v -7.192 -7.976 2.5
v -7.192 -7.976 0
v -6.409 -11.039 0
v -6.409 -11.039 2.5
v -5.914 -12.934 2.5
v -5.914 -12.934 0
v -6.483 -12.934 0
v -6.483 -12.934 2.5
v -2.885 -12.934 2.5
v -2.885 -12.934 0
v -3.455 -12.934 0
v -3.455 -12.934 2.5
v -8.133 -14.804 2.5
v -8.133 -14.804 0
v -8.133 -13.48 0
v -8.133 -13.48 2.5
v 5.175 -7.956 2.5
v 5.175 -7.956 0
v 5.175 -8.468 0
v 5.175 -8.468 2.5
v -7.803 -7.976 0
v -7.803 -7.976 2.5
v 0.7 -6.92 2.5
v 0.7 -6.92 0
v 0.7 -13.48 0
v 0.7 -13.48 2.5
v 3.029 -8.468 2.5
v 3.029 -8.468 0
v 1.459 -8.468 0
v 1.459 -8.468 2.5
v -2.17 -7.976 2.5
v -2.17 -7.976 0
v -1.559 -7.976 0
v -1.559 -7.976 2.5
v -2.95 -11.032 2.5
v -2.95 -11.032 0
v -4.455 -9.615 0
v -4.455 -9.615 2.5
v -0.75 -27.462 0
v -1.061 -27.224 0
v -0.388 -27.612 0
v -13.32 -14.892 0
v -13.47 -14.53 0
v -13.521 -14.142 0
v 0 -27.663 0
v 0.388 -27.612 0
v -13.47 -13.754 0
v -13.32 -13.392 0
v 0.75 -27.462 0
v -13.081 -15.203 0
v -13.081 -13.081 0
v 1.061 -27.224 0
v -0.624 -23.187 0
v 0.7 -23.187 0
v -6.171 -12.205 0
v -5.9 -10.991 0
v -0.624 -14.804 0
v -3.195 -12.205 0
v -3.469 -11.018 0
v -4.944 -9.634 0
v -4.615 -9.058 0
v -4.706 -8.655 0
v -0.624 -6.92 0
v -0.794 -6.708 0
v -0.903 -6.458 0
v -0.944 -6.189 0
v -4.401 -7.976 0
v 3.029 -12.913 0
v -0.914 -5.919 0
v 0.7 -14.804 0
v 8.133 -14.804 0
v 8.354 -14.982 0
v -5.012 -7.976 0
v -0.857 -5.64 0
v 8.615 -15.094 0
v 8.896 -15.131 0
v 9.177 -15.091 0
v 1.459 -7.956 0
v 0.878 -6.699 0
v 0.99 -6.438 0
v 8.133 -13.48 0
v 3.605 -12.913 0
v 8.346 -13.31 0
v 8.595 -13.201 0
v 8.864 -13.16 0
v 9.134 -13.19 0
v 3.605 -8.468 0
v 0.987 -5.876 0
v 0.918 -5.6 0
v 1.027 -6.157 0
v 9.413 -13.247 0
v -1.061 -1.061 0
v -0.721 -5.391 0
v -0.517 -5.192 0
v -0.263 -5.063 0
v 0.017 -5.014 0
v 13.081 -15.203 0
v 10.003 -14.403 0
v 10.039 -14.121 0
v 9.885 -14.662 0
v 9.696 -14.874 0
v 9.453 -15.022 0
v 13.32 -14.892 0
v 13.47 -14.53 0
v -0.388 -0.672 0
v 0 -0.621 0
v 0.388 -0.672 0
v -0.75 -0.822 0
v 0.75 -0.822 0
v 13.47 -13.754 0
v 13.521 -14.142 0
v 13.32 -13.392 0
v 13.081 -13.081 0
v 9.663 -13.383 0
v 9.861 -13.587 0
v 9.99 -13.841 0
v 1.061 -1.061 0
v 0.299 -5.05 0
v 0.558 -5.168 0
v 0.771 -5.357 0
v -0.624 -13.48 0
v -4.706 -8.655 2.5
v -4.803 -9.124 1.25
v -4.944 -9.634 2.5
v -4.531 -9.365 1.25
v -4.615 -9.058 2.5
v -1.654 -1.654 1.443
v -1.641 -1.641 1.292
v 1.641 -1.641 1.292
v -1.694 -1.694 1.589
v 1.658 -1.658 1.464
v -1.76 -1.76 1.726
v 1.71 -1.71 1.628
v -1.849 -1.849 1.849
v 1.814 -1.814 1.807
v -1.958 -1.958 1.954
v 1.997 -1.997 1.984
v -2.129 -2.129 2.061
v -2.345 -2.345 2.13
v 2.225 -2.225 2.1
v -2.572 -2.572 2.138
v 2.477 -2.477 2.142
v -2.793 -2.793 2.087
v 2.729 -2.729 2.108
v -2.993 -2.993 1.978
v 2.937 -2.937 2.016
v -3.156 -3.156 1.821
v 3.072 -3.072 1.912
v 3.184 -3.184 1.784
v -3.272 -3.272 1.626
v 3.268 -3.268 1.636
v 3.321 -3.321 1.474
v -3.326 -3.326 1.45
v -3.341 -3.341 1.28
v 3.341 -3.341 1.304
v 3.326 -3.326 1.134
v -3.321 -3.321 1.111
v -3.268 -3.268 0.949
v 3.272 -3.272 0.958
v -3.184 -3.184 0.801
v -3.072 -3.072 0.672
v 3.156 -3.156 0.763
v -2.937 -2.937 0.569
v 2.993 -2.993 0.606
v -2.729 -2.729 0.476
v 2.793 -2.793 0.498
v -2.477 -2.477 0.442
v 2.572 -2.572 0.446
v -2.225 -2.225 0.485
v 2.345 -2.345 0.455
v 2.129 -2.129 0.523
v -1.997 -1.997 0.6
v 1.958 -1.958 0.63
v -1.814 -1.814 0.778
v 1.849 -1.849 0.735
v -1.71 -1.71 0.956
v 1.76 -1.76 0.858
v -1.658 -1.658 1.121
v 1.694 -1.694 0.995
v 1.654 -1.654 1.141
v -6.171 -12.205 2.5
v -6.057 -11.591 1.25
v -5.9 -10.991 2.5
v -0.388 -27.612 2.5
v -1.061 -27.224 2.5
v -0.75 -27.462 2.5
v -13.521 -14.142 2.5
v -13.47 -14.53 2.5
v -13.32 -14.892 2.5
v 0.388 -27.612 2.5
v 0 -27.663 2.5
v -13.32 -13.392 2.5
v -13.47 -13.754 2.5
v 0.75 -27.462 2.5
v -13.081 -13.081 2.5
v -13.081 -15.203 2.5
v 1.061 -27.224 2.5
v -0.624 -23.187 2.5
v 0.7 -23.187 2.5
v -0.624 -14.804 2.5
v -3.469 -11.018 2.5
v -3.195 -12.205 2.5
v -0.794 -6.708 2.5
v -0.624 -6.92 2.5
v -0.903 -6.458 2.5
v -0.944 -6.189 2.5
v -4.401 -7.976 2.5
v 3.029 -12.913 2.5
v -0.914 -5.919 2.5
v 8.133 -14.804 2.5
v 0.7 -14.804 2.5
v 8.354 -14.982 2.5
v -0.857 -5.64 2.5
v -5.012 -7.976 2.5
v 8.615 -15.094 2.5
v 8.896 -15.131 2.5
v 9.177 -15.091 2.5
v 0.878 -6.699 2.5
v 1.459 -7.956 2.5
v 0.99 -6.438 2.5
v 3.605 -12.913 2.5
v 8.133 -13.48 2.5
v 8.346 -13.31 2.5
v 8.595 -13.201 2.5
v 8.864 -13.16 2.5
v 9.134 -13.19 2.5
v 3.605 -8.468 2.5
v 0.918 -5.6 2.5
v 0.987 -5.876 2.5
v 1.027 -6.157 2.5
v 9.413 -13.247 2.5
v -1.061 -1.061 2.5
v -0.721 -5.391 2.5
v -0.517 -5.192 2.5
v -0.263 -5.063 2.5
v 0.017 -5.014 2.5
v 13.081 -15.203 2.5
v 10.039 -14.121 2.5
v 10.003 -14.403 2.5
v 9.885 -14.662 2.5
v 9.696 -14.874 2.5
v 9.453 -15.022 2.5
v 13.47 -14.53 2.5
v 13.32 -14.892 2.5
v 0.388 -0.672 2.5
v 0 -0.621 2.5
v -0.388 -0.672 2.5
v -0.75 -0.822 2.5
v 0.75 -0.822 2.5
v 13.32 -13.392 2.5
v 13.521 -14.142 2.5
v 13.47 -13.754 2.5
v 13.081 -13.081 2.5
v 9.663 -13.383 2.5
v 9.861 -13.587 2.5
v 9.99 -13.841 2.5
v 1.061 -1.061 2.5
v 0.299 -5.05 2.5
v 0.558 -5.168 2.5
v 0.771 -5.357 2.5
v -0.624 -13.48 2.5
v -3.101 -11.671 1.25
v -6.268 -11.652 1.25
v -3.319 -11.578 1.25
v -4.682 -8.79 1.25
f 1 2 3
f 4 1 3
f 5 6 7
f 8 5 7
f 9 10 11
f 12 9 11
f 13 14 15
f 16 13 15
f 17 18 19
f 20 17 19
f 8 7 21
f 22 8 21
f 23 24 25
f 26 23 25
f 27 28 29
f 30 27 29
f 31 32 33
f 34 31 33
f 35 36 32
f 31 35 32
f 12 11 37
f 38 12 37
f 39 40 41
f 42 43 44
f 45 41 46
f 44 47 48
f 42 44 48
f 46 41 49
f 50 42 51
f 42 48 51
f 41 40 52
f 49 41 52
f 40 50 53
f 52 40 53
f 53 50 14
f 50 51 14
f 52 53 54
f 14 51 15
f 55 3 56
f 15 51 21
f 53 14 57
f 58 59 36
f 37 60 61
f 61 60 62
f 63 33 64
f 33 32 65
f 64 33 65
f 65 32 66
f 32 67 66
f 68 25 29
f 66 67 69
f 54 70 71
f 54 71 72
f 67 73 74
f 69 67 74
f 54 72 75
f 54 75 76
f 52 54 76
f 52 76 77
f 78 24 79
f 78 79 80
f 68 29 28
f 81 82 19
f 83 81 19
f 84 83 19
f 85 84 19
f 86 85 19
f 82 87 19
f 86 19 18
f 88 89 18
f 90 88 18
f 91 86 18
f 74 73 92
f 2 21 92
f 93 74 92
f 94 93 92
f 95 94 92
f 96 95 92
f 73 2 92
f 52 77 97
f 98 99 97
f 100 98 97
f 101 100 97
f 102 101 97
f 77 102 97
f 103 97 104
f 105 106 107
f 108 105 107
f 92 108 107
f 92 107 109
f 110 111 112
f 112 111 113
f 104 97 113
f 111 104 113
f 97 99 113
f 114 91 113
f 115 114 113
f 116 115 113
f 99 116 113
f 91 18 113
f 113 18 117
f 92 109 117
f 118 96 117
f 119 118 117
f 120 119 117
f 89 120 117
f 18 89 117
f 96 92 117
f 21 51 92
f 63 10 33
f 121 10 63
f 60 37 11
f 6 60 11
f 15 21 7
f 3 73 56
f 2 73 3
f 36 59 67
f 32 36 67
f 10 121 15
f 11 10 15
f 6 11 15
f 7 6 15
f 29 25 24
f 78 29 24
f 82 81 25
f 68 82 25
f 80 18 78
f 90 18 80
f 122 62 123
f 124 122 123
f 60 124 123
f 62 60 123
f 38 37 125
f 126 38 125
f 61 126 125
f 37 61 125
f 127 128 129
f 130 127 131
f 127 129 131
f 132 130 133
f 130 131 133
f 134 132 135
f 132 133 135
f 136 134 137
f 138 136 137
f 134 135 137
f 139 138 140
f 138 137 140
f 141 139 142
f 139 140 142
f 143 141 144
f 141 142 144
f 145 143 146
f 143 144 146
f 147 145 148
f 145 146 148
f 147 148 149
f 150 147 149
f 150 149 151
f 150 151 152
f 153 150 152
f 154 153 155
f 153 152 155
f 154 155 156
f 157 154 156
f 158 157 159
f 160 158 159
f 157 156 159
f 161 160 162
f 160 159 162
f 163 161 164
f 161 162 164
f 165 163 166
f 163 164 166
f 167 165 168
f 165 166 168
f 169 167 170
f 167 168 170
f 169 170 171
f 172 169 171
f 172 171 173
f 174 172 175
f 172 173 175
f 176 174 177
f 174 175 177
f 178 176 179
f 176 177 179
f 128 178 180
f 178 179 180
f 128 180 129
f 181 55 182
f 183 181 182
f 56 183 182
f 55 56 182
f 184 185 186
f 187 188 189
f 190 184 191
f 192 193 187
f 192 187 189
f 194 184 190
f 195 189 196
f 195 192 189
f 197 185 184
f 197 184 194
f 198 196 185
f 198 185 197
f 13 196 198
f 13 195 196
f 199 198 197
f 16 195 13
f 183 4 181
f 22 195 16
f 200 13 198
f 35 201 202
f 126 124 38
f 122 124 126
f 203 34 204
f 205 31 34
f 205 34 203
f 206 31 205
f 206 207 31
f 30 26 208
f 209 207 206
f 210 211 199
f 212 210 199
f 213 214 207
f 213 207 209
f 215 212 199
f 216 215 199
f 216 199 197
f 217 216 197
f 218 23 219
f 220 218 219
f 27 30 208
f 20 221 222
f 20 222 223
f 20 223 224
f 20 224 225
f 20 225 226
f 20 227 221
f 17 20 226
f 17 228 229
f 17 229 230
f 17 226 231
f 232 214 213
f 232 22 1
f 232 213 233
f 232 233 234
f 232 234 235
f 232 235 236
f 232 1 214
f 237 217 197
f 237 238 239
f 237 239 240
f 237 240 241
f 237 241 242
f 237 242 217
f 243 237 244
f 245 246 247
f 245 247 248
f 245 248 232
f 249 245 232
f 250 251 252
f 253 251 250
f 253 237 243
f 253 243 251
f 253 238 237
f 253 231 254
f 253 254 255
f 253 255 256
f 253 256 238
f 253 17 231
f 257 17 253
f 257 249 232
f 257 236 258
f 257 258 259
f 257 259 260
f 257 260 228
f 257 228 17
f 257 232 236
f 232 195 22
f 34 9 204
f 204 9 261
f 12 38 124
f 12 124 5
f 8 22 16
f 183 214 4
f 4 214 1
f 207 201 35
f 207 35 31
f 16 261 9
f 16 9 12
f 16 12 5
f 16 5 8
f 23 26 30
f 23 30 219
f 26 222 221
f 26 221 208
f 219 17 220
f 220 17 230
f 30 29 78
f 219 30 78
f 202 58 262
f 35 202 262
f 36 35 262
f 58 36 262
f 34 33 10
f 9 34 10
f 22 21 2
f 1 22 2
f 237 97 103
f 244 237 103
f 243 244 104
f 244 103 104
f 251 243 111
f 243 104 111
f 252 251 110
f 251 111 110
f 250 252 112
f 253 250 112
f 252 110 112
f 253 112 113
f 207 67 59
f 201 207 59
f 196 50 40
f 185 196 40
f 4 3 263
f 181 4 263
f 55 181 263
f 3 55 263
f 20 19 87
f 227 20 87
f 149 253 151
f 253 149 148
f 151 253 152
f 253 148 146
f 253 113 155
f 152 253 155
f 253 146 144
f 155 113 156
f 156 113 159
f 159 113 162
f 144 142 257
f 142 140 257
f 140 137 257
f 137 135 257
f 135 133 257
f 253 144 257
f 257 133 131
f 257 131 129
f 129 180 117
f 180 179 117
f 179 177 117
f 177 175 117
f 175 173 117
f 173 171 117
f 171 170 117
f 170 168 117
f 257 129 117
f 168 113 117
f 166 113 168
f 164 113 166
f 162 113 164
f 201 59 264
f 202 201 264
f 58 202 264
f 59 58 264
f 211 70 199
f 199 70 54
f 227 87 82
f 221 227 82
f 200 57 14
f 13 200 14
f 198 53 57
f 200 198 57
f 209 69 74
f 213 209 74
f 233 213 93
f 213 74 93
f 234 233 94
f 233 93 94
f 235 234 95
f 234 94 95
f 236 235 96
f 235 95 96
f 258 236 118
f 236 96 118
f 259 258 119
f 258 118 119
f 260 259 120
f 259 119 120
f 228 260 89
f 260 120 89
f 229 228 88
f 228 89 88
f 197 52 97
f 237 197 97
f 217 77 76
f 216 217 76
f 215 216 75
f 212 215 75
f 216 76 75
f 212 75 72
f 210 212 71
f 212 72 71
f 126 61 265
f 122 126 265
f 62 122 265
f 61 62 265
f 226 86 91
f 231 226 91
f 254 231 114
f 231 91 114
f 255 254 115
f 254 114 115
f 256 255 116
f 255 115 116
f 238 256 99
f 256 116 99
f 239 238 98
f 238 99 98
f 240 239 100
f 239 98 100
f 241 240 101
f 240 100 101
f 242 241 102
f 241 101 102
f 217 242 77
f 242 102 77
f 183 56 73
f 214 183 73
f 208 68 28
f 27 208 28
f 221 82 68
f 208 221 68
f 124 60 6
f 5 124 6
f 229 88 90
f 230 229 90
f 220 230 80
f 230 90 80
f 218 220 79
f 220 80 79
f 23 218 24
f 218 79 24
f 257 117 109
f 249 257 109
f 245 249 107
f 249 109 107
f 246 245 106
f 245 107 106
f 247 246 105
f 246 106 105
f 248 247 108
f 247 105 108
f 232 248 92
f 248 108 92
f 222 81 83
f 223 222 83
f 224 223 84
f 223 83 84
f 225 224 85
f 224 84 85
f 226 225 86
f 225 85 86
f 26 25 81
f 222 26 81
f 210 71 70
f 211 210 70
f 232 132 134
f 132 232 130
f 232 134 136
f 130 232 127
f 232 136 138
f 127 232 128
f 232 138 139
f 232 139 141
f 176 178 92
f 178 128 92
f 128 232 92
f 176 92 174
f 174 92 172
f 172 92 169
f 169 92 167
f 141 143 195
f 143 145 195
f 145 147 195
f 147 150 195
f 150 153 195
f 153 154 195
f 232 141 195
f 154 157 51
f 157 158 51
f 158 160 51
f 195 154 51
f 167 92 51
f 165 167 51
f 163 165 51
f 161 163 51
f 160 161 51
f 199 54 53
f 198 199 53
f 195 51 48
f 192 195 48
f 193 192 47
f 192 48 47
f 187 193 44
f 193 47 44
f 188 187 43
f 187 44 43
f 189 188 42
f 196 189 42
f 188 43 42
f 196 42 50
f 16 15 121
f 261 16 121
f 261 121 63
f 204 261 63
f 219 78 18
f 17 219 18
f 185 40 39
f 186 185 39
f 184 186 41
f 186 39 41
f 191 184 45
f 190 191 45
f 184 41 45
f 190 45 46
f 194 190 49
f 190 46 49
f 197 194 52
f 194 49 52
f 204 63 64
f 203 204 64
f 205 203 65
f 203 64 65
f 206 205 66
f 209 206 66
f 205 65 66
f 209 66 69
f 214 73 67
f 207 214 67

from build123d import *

# Parameters (mm, degrees)
F1_DEPTH = 2.5
F2_R     = 0.85
F3_DEPTH = 12.5


with BuildPart() as f1:
    # F0 (on Top) → F1 (new body)
    with BuildSketch(Plane.XY):
        with BuildLine():
            Line((13.081475452, -13.081475452), (1.0606601718, -1.0606601718))
            ThreePointArc((1.0606601718, -1.0606601718), (0, -0.6213203436), (-1.0606601718, -1.0606601718))
            Line((-1.0606601718, -1.0606601718), (-13.081475452, -13.081475452))
            ThreePointArc((-13.081475452, -13.081475452), (-13.5208152802, -14.1421356237), (-13.081475452, -15.2027957955))
            Line((-13.081475452, -15.2027957955), (-1.0606601718, -27.2236110757))
            ThreePointArc((-1.0606601718, -27.2236110757), (0, -27.6629509039), (1.0606601718, -27.2236110757))
            Line((1.0606601718, -27.2236110757), (13.081475452, -15.2027957955))
            ThreePointArc((13.081475452, -15.2027957955), (13.5208152802, -14.1421356237), (13.081475452, -13.081475452))
        make_face()
        with BuildLine():
            Line((-1.559338312, -7.9764372607), (-2.8852931731, -12.9341195524))
            Line((-2.8852931731, -12.9341195524), (-3.4549546314, -12.9341195524))
            Line((-3.4549546314, -12.9341195524), (-4.4553886592, -9.6148921218))
            add(Edge.make_bspline(
                [(-4.4553886592, -9.6148921218), (-4.5270032425, -9.3935379552), (-4.6148938675, -9.0582514968)],
                knots=[0, 0, 0, 1, 1, 1], degree=2))
            add(Edge.make_bspline(
                [(-4.6148938675, -9.0582514968), (-4.7027844925, -8.7229650385), (-4.7060397009, -8.6546056635)],
                knots=[0, 0, 0, 1, 1, 1], degree=2))
            add(Edge.make_bspline(
                [(-4.7060397009, -8.6546056635), (-4.7809094925, -9.102739344), (-4.9436699092, -9.6344233718)],
                knots=[0, 0, 0, 1, 1, 1], degree=2))
            Line((-4.9436699092, -9.6344233718), (-5.9137219925, -12.9341195524))
            Line((-5.9137219925, -12.9341195524), (-6.4833834509, -12.9341195524))
            Line((-6.4833834509, -12.9341195524), (-7.8028278953, -7.9764372607))
            Line((-7.8028278953, -7.9764372607), (-7.1919337981, -7.9764372607))
            Line((-7.1919337981, -7.9764372607), (-6.4085136592, -11.0385032329))
            add(Edge.make_bspline(
                [(-6.4085136592, -11.0385032329), (-6.2457532425, -11.6830344829), (-6.1708834509, -12.2049528857)],
                knots=[0, 0, 0, 1, 1, 1], degree=2))
            add(Edge.make_bspline(
                [(-6.1708834509, -12.2049528857), (-6.0797376175, -11.5842931635), (-5.8996160898, -10.9907601774)],
                knots=[0, 0, 0, 1, 1, 1], degree=2))
            Line((-5.8996160898, -10.9907601774), (-5.0120292842, -7.9764372607))
            Line((-5.0120292842, -7.9764372607), (-4.401135187, -7.9764372607))
            Line((-4.401135187, -7.9764372607), (-3.4690605342, -11.0178869135))
            add(Edge.make_bspline(
                [(-3.4690605342, -11.0178869135), (-3.3063001175, -11.544145594), (-3.1945379648, -12.2049528857)],
                knots=[0, 0, 0, 1, 1, 1], degree=2))
            add(Edge.make_bspline(
                [(-3.1945379648, -12.2049528857), (-3.1294337981, -11.7231820524), (-2.9503973398, -11.0319928163)],
                knots=[0, 0, 0, 1, 1, 1], degree=2))
            Line((-2.9503973398, -11.0319928163), (-2.1702324092, -7.9764372607))
            Line((-2.1702324092, -7.9764372607), (-1.559338312, -7.9764372607))
        make_face(mode=Mode.SUBTRACT)
        with BuildLine():
            Line((-8.1334756687, -14.8039748892), (-8.1334756687, -13.4802963582))
            Line((-8.1334756687, -13.4802963582), (-0.6236797201, -13.4802963582))
            Line((-0.6236797201, -13.4802963582), (-0.6236797201, -6.9198086858))
            ThreePointArc((-0.6236797201, -6.9198086858), (-0.9032194318, -6.4583786209), (-0.9135835525, -5.9189782686))
            ThreePointArc((-0.9135835525, -5.9189782686), (0.0168397474, -5.0141534426), (0.9868078824, -5.876451129))
            ThreePointArc((0.9868078824, -5.876451129), (0.9900106564, -6.4384308628), (0.6999988109, -6.9198086858))
            Line((0.6999988109, -6.9198086858), (0.6999988109, -13.4802963582))
            Line((0.6999988109, -13.4802963582), (8.1334756687, -13.4802963582))
            ThreePointArc((8.1334756687, -13.4802963582), (8.5949057336, -13.2007566465), (9.134306086, -13.1903925258))
            ThreePointArc((9.134306086, -13.1903925258), (10.0391309119, -14.1208158258), (9.1768332255, -15.0907839607))
            ThreePointArc((9.1768332255, -15.0907839607), (8.6148534917, -15.0939867347), (8.1334756687, -14.8039748892))
            Line((8.1334756687, -14.8039748892), (0.6999988109, -14.8039748892))
            Line((0.6999988109, -14.8039748892), (0.6999988109, -23.1867600232))
            Line((0.6999988109, -23.1867600232), (-0.6236797201, -23.1867600232))
            Line((-0.6236797201, -23.1867600232), (-0.6236797201, -14.8039748892))
            Line((-0.6236797201, -14.8039748892), (-8.1334756687, -14.8039748892))
        make_face(mode=Mode.SUBTRACT)
        Polygon((3.6052975431, -8.467799659), (3.6052975431, -12.9133291729), (3.0291256681, -12.9133291729), (3.0291256681, -8.467799659), (1.459030182, -8.467799659), (1.459030182, -7.9556468812), (5.1753930292, -7.9556468812), (5.1753930292, -8.467799659), align=None, mode=Mode.SUBTRACT)
    extrude(amount=F1_DEPTH)

    # F2 (on Right) → F3 (cut, symmetric)
    with BuildSketch(Plane.YZ):
        with Locations((-2.4908210296, 1.292226194)):
            Circle(F2_R)
    extrude(amount=F3_DEPTH, both=True, mode=Mode.SUBTRACT)


solid = f1.part
